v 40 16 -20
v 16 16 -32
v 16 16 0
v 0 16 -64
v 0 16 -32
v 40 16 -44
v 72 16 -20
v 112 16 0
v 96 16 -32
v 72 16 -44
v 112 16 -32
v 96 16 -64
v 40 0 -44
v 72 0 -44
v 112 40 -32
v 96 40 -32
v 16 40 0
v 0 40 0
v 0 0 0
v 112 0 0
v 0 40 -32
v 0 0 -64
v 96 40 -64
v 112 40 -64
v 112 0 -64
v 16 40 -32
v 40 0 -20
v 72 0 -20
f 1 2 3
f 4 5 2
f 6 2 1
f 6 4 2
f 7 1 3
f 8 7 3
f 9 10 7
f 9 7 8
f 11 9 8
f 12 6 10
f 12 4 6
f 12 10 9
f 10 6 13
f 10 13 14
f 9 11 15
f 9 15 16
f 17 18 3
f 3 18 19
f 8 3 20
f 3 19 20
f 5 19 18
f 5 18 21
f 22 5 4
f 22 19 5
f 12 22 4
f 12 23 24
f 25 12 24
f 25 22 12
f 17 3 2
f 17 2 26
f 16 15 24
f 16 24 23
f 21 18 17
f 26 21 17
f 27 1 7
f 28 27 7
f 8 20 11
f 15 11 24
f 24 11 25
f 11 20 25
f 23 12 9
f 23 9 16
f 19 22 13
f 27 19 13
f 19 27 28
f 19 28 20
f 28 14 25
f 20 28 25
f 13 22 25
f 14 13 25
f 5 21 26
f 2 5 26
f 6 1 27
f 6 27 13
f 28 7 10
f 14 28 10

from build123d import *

# Parameters (mm, degrees)
SKETCH1_W           = 112
SKETCH1_H           = 64
BOSS_EXTRUDE1_DEPTH = 16
SKETCH3_W           = 16
SKETCH3_H           = 40
BOSS_EXTRUDE2_DEPTH = 32
SKETCH6_W           = 16
SKETCH6_H           = 40
BOSS_EXTRUDE3_DEPTH = 32
CUT_EXTRUDE1_REACH  = 133.21
SKETCH7_W           = 32
SKETCH7_H           = 24


with BuildPart() as part:
    # Sketch1 → Boss-Extrude1 (new body)
    with BuildSketch(Plane(origin=(0, 0, 0), x_dir=(1, 0, 0), z_dir=(0, 1, 0))):
        with Locations((56, 32)):
            Rectangle(SKETCH1_W, SKETCH1_H)
    extrude(amount=BOSS_EXTRUDE1_DEPTH)

    # Sketch3 → Boss-Extrude2 (add)
    with BuildSketch(Plane.XY):
        with Locations((8, 20)):
            Rectangle(SKETCH3_W, SKETCH3_H)
    extrude(amount=-BOSS_EXTRUDE2_DEPTH)

    # Sketch6 → Boss-Extrude3 (add)
    with BuildSketch(Plane(origin=(0, 0, -64), x_dir=(-1, 0, 0), z_dir=(0, 0, -1))):
        with Locations((-104, 20)):
            Rectangle(SKETCH6_W, SKETCH6_H)
    extrude(amount=-BOSS_EXTRUDE3_DEPTH)

    # Sketch7 → Cut-Extrude1 (cut, up to next)
    with BuildSketch(Plane(origin=(0, 16, 0), x_dir=(1, 0, 0), z_dir=(0, 1, 0)), mode=Mode.PRIVATE) as cut_extrude1_sk1:
        with Locations((56, 32)):
            Rectangle(SKETCH7_W, SKETCH7_H)
    cut_extrude1_tool1 = extrude(cut_extrude1_sk1.sketch, amount=-CUT_EXTRUDE1_REACH, mode=Mode.PRIVATE) & part.part
    add(cut_extrude1_tool1.solids().sort_by_distance((56, 16, -32))[0], mode=Mode.SUBTRACT)


solid = part.part
